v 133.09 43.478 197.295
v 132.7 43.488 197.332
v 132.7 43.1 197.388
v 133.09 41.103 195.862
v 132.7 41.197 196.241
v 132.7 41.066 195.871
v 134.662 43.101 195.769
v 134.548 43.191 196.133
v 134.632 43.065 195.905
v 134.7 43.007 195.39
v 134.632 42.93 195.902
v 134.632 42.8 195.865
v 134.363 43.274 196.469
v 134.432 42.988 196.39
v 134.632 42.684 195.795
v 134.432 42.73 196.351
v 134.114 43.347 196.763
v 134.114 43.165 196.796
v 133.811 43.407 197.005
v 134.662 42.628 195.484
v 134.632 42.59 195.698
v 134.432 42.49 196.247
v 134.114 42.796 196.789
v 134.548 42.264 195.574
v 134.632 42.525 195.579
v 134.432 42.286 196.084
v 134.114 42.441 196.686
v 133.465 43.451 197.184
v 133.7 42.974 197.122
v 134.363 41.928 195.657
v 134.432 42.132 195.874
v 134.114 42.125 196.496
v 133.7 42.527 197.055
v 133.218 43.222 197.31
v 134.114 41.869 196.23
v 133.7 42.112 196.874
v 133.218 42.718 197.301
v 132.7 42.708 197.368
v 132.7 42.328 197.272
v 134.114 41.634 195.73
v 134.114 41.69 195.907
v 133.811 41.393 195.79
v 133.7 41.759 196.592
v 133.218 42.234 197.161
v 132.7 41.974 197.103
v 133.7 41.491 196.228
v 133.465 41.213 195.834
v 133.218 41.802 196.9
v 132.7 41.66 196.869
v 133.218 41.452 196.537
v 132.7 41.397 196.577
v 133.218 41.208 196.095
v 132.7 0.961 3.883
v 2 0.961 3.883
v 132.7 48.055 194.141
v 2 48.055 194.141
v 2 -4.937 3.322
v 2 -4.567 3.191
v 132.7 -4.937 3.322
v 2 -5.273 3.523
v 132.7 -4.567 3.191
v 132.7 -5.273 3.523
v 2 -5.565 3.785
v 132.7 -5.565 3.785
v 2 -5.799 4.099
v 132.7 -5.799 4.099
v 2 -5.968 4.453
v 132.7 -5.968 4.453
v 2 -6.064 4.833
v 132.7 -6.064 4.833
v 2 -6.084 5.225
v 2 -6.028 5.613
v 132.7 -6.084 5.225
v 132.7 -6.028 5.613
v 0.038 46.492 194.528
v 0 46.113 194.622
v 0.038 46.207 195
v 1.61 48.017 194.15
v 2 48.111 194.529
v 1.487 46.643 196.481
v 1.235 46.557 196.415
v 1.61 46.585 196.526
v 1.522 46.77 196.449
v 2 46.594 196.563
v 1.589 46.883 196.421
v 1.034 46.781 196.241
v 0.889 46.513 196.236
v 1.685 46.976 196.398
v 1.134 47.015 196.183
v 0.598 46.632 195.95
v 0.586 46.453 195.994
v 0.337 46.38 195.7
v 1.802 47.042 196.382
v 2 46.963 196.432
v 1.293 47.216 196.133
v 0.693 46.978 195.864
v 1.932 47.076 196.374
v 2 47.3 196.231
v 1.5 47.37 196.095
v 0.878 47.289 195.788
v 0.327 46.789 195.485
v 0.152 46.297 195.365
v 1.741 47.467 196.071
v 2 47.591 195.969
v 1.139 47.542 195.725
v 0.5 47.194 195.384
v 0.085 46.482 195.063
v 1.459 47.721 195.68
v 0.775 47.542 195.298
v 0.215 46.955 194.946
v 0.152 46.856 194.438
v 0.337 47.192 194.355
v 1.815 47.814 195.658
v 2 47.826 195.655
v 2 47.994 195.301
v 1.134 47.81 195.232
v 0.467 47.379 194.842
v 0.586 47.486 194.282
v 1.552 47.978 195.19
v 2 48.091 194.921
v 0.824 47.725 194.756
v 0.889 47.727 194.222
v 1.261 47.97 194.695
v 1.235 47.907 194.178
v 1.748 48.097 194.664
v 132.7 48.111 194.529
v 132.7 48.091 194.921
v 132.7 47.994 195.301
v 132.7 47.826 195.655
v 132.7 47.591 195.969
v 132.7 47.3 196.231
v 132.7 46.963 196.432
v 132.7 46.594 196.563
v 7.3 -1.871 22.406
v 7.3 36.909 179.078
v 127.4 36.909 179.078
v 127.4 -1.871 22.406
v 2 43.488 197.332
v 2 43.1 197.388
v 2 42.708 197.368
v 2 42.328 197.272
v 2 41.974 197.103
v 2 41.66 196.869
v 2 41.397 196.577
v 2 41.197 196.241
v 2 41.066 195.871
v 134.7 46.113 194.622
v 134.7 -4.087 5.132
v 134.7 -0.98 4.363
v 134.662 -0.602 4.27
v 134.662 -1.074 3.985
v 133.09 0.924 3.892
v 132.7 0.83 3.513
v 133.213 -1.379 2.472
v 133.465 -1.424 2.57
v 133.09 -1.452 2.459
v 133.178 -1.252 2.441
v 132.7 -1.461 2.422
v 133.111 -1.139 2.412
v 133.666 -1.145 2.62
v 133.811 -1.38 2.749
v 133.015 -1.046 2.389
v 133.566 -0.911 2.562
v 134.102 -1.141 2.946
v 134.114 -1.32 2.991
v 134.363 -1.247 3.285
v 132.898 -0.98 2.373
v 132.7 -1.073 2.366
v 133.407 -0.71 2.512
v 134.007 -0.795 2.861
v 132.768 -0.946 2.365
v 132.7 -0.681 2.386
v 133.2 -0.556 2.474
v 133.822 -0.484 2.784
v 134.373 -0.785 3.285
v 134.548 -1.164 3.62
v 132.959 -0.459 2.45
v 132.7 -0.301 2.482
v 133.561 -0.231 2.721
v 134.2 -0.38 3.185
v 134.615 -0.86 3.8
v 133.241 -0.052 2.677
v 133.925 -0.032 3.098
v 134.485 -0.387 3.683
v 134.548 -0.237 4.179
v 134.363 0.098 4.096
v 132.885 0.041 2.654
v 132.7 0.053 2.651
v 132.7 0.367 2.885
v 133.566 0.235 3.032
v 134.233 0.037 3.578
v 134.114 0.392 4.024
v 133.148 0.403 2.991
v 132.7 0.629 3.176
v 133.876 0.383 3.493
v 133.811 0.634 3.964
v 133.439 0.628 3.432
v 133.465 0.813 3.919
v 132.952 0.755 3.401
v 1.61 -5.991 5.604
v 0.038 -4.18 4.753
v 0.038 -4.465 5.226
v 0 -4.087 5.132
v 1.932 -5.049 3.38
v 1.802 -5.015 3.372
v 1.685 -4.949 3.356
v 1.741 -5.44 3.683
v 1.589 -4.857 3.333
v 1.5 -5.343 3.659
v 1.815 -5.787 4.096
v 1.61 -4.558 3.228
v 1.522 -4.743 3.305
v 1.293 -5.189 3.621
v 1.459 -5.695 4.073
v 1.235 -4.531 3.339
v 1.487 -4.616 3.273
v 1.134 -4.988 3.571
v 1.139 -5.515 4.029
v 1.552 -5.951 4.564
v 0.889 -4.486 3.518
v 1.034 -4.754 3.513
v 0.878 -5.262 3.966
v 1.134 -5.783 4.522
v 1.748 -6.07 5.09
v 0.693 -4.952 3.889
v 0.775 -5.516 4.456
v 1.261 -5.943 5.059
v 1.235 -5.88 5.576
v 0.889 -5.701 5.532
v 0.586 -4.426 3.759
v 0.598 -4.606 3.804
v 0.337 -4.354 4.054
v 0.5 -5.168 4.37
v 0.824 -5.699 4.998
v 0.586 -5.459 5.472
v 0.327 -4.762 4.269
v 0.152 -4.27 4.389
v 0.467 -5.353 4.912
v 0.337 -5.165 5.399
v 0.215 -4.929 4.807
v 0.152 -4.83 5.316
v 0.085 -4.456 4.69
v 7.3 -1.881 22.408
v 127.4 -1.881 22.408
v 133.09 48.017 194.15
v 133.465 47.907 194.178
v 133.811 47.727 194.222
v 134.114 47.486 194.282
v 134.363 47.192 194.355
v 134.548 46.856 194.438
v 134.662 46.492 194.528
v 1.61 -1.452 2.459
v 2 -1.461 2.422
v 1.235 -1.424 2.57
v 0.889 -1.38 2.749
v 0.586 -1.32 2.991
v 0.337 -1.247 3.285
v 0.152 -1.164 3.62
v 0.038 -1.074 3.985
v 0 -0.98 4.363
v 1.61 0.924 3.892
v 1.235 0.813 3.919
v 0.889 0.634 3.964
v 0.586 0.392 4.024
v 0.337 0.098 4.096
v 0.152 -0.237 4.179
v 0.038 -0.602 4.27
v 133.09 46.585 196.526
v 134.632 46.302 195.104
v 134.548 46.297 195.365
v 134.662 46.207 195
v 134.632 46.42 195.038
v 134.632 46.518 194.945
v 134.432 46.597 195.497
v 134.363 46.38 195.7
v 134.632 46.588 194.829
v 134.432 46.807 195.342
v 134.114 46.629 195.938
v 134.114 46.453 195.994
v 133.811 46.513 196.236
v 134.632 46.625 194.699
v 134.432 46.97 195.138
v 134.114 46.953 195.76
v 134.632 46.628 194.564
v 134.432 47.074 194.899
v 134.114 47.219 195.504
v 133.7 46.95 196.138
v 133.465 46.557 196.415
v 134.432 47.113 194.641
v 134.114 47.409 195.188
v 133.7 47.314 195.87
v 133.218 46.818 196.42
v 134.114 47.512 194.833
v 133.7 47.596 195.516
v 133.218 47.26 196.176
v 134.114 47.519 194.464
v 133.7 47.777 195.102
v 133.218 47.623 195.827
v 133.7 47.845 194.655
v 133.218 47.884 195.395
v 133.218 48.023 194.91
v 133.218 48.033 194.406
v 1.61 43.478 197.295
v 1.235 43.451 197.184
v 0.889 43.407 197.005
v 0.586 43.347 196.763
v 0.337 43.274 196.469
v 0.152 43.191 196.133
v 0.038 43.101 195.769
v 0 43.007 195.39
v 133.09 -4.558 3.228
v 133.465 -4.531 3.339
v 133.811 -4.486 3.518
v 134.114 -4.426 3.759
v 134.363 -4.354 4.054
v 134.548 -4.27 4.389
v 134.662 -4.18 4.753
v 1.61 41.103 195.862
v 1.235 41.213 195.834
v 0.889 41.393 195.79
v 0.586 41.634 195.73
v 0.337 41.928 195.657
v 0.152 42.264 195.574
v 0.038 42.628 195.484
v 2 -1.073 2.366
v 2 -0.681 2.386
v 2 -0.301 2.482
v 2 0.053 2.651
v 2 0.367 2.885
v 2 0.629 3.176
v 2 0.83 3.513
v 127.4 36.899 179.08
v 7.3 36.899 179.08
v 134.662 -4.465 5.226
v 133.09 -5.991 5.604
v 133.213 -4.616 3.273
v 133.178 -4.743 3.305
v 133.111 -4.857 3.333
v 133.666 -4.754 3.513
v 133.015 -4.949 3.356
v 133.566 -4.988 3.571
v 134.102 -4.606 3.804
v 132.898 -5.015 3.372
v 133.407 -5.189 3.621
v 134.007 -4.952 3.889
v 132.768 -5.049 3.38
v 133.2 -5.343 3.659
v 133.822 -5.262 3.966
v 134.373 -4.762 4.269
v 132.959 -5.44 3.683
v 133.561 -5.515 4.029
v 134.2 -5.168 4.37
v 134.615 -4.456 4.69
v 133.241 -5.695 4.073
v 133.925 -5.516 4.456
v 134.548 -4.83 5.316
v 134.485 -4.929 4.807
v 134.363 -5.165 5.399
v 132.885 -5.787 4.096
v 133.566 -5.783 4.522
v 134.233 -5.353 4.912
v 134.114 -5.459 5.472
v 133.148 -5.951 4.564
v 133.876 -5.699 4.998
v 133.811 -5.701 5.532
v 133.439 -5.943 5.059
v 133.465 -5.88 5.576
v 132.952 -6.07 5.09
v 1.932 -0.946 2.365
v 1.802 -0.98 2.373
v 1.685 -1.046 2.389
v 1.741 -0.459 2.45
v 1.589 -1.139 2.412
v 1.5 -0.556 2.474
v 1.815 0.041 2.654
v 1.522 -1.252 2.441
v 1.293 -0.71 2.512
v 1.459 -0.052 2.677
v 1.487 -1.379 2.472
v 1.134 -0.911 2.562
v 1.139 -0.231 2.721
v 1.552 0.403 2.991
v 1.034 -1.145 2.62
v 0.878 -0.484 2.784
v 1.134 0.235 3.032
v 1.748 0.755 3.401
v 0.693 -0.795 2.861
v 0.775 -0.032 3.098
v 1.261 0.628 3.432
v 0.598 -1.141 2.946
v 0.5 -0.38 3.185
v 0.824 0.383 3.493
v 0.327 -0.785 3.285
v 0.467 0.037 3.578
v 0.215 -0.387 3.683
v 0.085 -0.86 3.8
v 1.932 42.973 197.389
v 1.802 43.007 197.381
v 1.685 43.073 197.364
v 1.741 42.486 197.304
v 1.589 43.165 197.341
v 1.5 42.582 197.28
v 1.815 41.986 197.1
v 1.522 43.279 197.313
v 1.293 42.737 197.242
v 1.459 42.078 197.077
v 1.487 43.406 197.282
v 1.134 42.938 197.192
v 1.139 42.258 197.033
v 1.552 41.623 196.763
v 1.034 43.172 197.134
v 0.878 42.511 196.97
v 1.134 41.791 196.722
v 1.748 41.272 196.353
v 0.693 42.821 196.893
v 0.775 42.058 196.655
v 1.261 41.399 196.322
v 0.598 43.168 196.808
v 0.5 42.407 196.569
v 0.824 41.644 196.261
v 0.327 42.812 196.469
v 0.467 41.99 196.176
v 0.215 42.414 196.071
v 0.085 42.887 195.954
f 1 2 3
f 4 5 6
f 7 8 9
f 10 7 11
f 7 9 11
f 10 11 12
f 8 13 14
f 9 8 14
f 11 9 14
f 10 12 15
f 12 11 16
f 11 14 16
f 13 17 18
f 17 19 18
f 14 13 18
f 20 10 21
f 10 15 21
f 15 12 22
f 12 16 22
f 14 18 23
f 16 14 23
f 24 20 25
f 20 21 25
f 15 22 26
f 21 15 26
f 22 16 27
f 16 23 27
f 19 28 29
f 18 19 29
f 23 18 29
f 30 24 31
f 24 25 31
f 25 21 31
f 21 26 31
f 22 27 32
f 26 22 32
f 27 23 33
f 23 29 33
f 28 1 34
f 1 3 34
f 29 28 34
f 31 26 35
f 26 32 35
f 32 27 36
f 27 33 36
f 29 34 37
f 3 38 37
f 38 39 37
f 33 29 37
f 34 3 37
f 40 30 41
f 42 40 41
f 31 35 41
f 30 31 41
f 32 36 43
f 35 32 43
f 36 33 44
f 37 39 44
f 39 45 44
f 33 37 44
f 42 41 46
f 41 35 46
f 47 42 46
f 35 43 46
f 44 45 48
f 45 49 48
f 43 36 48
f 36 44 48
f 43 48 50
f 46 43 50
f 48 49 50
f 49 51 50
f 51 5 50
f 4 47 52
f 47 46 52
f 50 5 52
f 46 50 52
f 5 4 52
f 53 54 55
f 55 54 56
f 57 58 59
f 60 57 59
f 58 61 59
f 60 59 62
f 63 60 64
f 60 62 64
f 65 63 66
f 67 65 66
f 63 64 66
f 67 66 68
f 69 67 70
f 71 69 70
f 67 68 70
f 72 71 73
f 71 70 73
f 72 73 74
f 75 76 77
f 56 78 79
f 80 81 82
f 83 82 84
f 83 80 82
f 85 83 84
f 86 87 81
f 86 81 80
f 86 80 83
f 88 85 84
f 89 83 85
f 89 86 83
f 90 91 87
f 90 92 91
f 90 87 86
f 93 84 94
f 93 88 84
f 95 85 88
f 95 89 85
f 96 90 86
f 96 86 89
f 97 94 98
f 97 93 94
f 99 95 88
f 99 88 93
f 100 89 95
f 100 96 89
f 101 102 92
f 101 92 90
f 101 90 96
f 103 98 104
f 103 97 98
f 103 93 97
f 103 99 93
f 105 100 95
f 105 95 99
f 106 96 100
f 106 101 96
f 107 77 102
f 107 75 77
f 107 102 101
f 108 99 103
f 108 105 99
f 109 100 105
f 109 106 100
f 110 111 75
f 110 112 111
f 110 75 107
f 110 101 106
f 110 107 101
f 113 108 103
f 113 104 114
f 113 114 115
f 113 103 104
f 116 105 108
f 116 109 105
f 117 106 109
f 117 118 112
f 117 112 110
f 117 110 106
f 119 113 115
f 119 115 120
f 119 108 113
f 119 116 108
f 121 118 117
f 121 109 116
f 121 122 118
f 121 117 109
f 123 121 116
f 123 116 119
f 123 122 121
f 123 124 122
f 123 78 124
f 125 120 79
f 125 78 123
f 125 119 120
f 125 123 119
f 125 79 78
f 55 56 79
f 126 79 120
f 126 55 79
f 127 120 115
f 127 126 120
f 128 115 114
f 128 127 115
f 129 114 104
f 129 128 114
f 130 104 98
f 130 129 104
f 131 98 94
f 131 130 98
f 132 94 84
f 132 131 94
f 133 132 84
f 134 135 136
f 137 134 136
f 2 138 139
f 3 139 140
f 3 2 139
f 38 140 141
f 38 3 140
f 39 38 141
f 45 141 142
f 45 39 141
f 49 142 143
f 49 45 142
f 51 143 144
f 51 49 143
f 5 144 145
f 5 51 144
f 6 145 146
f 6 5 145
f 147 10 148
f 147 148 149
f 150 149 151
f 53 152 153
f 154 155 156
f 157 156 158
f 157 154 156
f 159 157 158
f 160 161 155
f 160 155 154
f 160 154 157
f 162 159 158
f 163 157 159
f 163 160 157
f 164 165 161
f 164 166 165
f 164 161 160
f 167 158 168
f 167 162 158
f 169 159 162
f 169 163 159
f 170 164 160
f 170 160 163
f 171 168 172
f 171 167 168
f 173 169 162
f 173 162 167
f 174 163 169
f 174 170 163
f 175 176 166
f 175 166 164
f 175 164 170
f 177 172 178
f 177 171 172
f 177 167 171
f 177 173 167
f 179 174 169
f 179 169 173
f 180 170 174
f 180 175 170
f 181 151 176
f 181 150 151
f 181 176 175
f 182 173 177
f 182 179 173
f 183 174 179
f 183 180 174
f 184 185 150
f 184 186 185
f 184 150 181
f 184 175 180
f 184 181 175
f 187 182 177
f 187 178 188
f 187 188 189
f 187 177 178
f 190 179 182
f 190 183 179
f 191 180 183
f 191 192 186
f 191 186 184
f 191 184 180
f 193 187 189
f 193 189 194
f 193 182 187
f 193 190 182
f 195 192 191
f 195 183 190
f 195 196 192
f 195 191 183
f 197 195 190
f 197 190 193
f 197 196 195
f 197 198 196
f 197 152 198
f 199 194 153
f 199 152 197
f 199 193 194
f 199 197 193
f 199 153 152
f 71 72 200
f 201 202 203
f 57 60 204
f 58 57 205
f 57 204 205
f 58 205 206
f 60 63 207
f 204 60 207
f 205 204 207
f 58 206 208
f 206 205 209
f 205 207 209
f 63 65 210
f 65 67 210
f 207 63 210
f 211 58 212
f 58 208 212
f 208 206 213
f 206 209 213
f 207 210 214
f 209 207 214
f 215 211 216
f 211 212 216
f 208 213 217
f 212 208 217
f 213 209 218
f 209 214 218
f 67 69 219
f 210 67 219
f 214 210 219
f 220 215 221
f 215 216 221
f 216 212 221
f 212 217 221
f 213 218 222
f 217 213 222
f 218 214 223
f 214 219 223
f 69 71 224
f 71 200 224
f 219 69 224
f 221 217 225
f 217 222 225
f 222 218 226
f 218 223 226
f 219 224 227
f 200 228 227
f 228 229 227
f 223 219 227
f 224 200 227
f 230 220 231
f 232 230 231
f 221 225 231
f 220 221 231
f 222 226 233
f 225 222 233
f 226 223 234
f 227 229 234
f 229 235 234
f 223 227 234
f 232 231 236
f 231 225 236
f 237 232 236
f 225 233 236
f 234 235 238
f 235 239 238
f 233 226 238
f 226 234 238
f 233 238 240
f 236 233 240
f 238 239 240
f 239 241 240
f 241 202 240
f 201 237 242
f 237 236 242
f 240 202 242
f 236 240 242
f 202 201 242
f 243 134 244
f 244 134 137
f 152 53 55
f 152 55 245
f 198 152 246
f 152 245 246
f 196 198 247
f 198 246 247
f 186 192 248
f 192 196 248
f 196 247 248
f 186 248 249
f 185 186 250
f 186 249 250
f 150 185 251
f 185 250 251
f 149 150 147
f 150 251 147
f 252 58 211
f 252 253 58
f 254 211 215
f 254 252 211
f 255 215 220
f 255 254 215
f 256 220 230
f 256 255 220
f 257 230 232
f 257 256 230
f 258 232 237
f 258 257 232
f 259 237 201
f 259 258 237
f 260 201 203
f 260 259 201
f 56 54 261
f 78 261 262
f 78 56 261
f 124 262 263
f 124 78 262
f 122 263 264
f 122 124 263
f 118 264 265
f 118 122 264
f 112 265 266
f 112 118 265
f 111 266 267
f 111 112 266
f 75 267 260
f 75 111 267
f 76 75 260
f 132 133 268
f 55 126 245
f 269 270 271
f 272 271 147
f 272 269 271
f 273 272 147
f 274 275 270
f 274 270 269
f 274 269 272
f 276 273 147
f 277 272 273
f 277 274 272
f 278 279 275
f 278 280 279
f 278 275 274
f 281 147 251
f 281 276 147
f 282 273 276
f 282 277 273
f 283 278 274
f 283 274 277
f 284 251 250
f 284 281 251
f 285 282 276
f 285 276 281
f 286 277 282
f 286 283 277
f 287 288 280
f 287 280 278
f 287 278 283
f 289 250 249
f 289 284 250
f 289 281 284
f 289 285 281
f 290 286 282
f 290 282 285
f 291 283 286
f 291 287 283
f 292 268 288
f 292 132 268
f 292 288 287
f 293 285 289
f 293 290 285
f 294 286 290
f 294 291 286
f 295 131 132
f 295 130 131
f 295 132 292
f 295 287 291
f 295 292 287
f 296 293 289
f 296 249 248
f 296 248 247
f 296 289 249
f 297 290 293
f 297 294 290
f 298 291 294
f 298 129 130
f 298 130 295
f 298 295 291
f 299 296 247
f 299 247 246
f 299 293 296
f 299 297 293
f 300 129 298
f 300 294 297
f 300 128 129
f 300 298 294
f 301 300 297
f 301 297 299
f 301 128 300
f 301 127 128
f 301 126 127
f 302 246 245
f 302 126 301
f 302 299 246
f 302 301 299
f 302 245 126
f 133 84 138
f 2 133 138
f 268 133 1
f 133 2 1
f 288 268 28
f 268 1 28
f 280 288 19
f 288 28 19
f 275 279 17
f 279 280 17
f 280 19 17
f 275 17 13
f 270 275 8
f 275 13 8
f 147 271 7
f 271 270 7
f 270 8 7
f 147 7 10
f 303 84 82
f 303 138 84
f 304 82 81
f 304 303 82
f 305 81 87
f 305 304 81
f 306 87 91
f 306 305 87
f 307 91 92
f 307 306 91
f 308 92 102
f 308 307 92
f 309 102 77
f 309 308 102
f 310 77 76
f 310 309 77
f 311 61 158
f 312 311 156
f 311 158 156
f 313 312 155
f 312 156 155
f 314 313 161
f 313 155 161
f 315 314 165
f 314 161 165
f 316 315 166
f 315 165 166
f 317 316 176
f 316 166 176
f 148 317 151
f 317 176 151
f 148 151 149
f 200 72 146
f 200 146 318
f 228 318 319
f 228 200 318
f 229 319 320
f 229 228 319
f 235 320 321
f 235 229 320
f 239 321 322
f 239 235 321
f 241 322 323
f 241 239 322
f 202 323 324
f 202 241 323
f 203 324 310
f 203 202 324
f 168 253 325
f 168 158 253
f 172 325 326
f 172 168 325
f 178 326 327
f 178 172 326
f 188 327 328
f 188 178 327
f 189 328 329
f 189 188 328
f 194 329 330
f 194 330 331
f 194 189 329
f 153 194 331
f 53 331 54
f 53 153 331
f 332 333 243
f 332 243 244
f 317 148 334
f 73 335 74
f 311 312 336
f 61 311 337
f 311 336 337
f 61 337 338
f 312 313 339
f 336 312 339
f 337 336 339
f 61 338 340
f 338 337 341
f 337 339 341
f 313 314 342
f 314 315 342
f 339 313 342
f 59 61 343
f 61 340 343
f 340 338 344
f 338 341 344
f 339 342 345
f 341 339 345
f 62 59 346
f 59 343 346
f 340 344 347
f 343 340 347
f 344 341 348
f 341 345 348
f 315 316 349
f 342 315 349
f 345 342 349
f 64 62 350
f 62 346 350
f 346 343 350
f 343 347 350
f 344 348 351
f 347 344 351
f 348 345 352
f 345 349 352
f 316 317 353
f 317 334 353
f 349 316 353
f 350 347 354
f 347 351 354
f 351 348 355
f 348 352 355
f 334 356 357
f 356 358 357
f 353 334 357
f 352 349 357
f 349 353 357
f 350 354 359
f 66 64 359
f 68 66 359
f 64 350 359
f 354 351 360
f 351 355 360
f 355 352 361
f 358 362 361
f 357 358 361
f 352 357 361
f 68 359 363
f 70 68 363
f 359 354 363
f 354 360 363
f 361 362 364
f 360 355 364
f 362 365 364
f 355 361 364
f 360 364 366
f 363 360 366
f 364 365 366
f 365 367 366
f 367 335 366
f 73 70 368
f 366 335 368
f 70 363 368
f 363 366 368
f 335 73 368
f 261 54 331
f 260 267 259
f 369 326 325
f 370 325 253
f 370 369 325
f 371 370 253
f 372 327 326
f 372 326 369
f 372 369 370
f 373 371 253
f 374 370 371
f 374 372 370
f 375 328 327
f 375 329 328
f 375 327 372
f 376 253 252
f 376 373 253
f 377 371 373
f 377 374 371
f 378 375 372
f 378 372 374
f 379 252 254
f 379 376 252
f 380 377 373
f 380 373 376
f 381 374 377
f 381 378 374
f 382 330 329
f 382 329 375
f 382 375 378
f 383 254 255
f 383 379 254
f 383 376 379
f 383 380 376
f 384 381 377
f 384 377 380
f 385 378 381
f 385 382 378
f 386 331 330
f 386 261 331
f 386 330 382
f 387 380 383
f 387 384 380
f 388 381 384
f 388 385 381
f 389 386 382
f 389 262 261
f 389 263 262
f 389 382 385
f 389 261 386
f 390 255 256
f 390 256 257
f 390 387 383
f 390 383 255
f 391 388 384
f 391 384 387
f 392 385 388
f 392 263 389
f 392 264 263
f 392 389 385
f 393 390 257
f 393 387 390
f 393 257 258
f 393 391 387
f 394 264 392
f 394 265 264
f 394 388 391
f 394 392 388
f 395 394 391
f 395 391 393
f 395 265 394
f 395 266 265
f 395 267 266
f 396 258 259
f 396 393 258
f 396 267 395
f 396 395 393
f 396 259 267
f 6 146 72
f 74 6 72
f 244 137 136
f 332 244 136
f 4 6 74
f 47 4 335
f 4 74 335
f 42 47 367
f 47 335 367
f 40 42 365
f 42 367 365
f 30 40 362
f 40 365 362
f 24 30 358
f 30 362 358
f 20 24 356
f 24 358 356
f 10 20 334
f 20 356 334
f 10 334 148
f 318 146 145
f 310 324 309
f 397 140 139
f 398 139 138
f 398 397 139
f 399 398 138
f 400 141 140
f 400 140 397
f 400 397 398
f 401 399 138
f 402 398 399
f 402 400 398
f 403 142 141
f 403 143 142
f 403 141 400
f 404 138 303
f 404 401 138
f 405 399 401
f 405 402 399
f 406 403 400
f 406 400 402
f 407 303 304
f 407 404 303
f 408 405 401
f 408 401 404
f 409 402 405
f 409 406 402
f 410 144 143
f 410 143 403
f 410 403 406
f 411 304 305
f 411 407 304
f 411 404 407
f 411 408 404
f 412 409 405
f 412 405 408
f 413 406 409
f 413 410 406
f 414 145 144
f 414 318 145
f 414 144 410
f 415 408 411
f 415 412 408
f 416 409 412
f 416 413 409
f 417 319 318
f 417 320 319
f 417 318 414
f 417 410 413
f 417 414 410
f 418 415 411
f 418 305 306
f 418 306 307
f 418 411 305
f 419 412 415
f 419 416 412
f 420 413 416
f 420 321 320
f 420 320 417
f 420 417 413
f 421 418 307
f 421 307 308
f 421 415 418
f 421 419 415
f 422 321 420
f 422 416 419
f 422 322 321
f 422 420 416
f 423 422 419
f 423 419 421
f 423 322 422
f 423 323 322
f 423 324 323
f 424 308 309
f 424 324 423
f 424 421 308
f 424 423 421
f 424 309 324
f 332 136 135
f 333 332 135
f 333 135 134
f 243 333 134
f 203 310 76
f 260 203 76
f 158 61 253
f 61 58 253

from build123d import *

# Parameters (mm, degrees)
F1_DEPTH = 134.7
F3_R     = 2
F4_DEPTH = 0.01


with BuildPart() as f1:
    # F0 (on Right) → F1 (new body)
    with BuildSketch(Plane.YZ):
        Polygon((-6.508532, 3.671378), (0.480546, 1.941411), (48.535184, 196.082472), (41.546106, 197.812439), align=None)
    extrude(amount=F1_DEPTH)

    # F3
    f3_edges = [f1.edges().sort_by_distance(p)[0] for p in [
        (0, 17.518787, 100.741908),
        (0, 24.507865, 99.011941),
        (67.35, 41.546106, 197.812439),
        (0, 45.040645, 196.947456),
        (67.35, 48.535184, 196.082472),
        (134.7, 45.040645, 196.947456),
        (134.7, 24.507865, 99.011941),
        (134.7, 17.518787, 100.741908),
        (134.7, -3.013993, 2.806394),
        (67.35, -6.508532, 3.671378),
        (67.35, 0.480546, 1.941411),
        (0, -3.013993, 2.806394),
    ]]
    fillet(f3_edges, radius=F3_R)


with BuildPart() as f4:
    # F2 (on face) → F4 (new body)
    with BuildSketch(Plane(origin=(0, -6.989078, 1.729967), x_dir=(1, 0, 0), z_dir=(0, -0.970705, 0.240273))):
        Polygon((7.3, 182.7), (7.3, 102), (7.3, 21.3), (67.35, 21.3), (127.4, 21.3), (127.4, 102), (127.4, 182.7), (67.35, 182.7), align=None)
    extrude(amount=F4_DEPTH)


solid = Compound([f1.part, f4.part])
